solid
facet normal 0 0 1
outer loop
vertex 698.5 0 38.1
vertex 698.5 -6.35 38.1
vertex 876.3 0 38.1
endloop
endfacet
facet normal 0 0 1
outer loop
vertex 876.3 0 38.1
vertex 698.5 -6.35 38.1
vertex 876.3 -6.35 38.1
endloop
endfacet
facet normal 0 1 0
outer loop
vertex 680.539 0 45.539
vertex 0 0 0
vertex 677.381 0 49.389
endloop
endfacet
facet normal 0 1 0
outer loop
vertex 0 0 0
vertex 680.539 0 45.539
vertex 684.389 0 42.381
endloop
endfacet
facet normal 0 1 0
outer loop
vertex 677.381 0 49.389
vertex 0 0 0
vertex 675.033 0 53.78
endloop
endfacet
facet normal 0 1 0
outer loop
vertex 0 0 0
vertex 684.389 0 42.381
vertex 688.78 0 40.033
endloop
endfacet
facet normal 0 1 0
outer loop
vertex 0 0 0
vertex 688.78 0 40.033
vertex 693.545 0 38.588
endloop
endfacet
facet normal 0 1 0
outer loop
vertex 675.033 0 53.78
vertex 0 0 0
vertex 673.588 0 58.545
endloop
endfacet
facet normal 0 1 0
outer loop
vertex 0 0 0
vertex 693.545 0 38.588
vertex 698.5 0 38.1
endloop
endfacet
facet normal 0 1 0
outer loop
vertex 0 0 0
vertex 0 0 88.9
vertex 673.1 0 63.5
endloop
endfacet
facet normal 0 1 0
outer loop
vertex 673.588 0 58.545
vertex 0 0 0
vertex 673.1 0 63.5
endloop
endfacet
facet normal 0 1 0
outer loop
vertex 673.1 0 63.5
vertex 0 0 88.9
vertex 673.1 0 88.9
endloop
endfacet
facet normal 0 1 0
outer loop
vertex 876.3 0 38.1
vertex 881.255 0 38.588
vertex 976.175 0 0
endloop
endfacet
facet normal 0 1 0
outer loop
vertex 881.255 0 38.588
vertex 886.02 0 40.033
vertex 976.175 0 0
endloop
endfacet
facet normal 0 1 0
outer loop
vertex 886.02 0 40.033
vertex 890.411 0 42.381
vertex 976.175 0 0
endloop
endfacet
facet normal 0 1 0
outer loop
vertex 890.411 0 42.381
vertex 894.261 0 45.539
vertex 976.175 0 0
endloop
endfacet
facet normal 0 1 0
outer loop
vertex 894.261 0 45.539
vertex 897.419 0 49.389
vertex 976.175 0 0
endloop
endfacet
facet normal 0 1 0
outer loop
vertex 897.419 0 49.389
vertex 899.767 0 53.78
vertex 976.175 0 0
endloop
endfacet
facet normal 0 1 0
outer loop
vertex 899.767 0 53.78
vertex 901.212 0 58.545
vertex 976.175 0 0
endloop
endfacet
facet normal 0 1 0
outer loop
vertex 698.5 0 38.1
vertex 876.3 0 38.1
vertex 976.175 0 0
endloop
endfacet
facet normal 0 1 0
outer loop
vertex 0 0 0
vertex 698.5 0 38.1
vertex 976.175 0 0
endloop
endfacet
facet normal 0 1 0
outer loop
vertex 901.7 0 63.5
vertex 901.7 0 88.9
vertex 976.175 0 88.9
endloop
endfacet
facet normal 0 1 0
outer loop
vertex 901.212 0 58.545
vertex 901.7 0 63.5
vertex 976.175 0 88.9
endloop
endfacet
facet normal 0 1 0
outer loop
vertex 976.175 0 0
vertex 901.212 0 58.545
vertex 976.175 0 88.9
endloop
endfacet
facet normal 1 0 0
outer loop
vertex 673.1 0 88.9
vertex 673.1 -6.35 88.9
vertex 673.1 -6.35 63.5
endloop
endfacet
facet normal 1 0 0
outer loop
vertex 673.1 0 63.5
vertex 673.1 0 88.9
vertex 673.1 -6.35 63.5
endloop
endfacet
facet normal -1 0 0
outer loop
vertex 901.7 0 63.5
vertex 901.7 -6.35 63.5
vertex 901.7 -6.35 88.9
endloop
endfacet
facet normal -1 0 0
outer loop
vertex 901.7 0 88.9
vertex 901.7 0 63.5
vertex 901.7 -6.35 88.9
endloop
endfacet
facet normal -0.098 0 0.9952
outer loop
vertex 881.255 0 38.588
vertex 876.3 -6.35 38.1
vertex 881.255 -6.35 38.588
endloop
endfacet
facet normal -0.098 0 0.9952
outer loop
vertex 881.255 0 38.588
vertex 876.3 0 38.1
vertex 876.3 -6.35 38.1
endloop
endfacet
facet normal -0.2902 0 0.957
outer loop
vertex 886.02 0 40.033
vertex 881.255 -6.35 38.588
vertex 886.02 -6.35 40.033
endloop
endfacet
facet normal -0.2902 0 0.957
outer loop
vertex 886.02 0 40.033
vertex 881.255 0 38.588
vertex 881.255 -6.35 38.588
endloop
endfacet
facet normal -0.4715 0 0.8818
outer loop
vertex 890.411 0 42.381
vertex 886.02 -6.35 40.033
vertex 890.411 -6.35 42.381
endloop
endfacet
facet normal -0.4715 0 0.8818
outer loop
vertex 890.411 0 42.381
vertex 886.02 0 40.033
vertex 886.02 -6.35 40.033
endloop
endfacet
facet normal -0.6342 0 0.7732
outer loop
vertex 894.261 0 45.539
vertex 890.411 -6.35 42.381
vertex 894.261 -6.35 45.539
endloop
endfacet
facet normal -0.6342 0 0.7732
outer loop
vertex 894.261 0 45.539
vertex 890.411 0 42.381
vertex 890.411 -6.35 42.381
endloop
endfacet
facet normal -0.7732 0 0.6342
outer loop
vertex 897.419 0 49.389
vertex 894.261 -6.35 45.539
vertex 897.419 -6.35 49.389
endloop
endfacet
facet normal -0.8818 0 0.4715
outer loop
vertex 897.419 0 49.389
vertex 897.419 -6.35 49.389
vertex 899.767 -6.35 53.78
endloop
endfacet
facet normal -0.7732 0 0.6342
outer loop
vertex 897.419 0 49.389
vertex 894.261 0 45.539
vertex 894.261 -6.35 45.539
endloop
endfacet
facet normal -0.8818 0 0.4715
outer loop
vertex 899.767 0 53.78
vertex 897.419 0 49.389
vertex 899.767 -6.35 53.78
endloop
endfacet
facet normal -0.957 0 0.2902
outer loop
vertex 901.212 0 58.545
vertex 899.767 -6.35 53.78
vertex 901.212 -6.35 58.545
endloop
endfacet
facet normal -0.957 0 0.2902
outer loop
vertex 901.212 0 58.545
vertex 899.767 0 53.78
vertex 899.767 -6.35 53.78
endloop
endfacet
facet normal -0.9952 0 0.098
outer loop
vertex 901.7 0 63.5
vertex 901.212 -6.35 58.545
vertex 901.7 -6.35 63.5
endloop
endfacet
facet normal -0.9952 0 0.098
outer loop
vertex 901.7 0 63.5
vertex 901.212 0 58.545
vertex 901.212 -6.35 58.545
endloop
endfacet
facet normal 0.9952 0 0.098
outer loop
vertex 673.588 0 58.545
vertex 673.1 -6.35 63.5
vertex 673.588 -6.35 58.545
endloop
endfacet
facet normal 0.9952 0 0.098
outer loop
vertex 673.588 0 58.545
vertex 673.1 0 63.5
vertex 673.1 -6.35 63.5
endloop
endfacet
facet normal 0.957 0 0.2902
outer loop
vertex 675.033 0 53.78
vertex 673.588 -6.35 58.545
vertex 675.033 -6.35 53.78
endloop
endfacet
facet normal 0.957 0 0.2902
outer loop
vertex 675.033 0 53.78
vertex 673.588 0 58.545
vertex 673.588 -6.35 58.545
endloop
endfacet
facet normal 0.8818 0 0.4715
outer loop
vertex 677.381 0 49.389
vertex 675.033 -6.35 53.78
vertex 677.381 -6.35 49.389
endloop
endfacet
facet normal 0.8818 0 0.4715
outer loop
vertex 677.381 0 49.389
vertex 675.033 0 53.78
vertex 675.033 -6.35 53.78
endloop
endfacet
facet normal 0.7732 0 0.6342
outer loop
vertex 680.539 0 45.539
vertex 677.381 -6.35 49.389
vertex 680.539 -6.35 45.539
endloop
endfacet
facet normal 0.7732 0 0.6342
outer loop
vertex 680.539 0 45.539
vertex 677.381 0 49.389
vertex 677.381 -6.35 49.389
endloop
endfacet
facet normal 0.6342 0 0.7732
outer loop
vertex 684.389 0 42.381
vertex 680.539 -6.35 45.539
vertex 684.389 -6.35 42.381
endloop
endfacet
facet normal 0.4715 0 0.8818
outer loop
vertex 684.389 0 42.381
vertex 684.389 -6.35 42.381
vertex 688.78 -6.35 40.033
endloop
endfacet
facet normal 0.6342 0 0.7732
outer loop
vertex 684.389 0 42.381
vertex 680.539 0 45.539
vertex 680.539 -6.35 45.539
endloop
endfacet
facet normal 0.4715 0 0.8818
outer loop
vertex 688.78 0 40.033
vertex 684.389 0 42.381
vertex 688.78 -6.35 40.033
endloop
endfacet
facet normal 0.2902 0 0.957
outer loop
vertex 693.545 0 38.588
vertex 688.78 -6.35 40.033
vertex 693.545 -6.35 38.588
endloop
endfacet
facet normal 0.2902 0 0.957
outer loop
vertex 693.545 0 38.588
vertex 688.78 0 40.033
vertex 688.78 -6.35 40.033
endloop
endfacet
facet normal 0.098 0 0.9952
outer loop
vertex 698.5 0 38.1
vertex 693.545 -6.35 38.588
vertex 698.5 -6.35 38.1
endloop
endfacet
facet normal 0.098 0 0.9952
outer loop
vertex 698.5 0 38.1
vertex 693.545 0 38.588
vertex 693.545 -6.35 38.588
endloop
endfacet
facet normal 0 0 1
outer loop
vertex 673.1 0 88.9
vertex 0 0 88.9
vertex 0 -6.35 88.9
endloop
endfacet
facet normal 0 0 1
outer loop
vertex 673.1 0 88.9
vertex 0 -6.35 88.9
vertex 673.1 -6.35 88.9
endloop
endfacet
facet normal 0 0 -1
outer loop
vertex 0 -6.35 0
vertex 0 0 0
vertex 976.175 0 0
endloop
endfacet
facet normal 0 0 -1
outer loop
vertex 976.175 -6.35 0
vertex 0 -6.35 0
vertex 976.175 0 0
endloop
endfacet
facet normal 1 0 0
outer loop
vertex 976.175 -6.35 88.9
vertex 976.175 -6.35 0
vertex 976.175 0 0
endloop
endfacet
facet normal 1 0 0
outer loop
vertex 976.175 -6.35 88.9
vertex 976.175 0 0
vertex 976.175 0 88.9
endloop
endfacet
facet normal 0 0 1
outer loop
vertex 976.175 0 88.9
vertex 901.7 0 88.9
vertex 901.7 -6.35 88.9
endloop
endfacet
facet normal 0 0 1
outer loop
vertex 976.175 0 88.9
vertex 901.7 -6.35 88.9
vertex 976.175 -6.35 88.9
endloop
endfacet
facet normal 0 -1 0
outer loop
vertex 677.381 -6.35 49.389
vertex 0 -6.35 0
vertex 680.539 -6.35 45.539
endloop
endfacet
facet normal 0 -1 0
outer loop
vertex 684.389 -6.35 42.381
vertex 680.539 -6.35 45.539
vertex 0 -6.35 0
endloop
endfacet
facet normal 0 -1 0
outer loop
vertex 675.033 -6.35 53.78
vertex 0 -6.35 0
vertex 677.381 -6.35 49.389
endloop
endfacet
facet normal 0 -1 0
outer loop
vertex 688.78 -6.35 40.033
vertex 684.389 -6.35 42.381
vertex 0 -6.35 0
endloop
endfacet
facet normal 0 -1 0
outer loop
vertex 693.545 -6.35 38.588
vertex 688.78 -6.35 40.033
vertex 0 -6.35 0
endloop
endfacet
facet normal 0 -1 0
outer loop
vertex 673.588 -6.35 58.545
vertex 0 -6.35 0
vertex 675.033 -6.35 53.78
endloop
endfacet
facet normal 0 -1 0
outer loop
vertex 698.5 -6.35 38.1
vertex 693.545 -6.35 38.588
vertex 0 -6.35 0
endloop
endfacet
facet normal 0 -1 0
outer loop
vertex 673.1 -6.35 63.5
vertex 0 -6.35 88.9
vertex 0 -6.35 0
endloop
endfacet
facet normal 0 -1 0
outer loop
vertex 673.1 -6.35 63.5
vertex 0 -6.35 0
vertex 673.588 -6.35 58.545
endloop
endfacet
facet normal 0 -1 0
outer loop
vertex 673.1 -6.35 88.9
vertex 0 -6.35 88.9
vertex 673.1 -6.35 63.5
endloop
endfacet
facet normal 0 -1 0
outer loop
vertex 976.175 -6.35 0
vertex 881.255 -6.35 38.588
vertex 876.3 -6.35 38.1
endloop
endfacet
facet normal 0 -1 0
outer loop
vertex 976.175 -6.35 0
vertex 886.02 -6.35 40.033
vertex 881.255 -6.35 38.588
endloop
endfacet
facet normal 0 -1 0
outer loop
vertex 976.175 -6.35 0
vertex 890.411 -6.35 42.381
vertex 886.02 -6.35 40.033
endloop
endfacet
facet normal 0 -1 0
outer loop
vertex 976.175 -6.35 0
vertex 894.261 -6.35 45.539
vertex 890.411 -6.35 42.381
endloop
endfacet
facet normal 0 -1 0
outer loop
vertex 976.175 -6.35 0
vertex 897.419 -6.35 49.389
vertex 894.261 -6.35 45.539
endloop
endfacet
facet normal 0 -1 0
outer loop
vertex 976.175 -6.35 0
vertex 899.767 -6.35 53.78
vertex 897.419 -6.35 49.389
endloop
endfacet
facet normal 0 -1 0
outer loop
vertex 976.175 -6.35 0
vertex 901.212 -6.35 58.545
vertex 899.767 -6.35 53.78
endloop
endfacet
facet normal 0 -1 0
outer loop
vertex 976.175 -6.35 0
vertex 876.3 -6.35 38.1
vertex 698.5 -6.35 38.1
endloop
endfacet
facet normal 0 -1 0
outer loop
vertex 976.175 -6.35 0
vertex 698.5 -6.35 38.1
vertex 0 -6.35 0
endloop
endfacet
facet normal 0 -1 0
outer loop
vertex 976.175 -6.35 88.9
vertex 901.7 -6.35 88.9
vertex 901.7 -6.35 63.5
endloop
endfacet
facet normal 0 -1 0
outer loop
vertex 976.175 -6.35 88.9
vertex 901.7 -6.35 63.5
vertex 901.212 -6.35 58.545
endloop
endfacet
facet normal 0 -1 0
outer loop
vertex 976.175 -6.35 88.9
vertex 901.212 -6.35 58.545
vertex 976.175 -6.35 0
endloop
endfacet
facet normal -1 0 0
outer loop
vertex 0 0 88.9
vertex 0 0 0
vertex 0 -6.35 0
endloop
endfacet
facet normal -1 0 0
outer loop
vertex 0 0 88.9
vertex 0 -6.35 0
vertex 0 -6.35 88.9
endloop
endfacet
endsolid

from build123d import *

# Parameters (mm, degrees)
F0_W     = 2438.4
F0_H     = 88.9
F1_DEPTH = 6.35
F3_DEPTH = 6.351
F4_R     = 25.4
F5_W     = 1462.224513
F5_H     = 88.9
F6_DEPTH = 6.351


with BuildPart() as f1:
    # F0 (on Front) → F1 (new body)
    with BuildSketch(Plane.XZ):
        with Locations((1219.2, 44.45)):
            Rectangle(F0_W, F0_H)
    extrude(amount=F1_DEPTH)

    # F2 (on face) → F3 (cut, through all)
    with BuildSketch(Plane.XZ.offset(6.35)):
        Polygon((901.7, 88.9), (673.1, 88.9), (673.1, 38.1), (787.4, 38.1), (901.7, 38.1), align=None)
    extrude(amount=-F3_DEPTH, mode=Mode.SUBTRACT)

    # F4
    f4_edges = [f1.edges().sort_by_distance(p)[0] for p in [
        (673.1, -3.175, 38.1),
        (901.7, -3.175, 38.1),
    ]]
    fillet(f4_edges, radius=F4_R)

    # F5 (on face) → F6 (cut, through all)
    with BuildSketch(Plane.XZ.offset(6.35)):
        with Locations((1707.287744, 44.45)):
            Rectangle(F5_W, F5_H)
    extrude(amount=-F6_DEPTH, mode=Mode.SUBTRACT)


solid = f1.part
